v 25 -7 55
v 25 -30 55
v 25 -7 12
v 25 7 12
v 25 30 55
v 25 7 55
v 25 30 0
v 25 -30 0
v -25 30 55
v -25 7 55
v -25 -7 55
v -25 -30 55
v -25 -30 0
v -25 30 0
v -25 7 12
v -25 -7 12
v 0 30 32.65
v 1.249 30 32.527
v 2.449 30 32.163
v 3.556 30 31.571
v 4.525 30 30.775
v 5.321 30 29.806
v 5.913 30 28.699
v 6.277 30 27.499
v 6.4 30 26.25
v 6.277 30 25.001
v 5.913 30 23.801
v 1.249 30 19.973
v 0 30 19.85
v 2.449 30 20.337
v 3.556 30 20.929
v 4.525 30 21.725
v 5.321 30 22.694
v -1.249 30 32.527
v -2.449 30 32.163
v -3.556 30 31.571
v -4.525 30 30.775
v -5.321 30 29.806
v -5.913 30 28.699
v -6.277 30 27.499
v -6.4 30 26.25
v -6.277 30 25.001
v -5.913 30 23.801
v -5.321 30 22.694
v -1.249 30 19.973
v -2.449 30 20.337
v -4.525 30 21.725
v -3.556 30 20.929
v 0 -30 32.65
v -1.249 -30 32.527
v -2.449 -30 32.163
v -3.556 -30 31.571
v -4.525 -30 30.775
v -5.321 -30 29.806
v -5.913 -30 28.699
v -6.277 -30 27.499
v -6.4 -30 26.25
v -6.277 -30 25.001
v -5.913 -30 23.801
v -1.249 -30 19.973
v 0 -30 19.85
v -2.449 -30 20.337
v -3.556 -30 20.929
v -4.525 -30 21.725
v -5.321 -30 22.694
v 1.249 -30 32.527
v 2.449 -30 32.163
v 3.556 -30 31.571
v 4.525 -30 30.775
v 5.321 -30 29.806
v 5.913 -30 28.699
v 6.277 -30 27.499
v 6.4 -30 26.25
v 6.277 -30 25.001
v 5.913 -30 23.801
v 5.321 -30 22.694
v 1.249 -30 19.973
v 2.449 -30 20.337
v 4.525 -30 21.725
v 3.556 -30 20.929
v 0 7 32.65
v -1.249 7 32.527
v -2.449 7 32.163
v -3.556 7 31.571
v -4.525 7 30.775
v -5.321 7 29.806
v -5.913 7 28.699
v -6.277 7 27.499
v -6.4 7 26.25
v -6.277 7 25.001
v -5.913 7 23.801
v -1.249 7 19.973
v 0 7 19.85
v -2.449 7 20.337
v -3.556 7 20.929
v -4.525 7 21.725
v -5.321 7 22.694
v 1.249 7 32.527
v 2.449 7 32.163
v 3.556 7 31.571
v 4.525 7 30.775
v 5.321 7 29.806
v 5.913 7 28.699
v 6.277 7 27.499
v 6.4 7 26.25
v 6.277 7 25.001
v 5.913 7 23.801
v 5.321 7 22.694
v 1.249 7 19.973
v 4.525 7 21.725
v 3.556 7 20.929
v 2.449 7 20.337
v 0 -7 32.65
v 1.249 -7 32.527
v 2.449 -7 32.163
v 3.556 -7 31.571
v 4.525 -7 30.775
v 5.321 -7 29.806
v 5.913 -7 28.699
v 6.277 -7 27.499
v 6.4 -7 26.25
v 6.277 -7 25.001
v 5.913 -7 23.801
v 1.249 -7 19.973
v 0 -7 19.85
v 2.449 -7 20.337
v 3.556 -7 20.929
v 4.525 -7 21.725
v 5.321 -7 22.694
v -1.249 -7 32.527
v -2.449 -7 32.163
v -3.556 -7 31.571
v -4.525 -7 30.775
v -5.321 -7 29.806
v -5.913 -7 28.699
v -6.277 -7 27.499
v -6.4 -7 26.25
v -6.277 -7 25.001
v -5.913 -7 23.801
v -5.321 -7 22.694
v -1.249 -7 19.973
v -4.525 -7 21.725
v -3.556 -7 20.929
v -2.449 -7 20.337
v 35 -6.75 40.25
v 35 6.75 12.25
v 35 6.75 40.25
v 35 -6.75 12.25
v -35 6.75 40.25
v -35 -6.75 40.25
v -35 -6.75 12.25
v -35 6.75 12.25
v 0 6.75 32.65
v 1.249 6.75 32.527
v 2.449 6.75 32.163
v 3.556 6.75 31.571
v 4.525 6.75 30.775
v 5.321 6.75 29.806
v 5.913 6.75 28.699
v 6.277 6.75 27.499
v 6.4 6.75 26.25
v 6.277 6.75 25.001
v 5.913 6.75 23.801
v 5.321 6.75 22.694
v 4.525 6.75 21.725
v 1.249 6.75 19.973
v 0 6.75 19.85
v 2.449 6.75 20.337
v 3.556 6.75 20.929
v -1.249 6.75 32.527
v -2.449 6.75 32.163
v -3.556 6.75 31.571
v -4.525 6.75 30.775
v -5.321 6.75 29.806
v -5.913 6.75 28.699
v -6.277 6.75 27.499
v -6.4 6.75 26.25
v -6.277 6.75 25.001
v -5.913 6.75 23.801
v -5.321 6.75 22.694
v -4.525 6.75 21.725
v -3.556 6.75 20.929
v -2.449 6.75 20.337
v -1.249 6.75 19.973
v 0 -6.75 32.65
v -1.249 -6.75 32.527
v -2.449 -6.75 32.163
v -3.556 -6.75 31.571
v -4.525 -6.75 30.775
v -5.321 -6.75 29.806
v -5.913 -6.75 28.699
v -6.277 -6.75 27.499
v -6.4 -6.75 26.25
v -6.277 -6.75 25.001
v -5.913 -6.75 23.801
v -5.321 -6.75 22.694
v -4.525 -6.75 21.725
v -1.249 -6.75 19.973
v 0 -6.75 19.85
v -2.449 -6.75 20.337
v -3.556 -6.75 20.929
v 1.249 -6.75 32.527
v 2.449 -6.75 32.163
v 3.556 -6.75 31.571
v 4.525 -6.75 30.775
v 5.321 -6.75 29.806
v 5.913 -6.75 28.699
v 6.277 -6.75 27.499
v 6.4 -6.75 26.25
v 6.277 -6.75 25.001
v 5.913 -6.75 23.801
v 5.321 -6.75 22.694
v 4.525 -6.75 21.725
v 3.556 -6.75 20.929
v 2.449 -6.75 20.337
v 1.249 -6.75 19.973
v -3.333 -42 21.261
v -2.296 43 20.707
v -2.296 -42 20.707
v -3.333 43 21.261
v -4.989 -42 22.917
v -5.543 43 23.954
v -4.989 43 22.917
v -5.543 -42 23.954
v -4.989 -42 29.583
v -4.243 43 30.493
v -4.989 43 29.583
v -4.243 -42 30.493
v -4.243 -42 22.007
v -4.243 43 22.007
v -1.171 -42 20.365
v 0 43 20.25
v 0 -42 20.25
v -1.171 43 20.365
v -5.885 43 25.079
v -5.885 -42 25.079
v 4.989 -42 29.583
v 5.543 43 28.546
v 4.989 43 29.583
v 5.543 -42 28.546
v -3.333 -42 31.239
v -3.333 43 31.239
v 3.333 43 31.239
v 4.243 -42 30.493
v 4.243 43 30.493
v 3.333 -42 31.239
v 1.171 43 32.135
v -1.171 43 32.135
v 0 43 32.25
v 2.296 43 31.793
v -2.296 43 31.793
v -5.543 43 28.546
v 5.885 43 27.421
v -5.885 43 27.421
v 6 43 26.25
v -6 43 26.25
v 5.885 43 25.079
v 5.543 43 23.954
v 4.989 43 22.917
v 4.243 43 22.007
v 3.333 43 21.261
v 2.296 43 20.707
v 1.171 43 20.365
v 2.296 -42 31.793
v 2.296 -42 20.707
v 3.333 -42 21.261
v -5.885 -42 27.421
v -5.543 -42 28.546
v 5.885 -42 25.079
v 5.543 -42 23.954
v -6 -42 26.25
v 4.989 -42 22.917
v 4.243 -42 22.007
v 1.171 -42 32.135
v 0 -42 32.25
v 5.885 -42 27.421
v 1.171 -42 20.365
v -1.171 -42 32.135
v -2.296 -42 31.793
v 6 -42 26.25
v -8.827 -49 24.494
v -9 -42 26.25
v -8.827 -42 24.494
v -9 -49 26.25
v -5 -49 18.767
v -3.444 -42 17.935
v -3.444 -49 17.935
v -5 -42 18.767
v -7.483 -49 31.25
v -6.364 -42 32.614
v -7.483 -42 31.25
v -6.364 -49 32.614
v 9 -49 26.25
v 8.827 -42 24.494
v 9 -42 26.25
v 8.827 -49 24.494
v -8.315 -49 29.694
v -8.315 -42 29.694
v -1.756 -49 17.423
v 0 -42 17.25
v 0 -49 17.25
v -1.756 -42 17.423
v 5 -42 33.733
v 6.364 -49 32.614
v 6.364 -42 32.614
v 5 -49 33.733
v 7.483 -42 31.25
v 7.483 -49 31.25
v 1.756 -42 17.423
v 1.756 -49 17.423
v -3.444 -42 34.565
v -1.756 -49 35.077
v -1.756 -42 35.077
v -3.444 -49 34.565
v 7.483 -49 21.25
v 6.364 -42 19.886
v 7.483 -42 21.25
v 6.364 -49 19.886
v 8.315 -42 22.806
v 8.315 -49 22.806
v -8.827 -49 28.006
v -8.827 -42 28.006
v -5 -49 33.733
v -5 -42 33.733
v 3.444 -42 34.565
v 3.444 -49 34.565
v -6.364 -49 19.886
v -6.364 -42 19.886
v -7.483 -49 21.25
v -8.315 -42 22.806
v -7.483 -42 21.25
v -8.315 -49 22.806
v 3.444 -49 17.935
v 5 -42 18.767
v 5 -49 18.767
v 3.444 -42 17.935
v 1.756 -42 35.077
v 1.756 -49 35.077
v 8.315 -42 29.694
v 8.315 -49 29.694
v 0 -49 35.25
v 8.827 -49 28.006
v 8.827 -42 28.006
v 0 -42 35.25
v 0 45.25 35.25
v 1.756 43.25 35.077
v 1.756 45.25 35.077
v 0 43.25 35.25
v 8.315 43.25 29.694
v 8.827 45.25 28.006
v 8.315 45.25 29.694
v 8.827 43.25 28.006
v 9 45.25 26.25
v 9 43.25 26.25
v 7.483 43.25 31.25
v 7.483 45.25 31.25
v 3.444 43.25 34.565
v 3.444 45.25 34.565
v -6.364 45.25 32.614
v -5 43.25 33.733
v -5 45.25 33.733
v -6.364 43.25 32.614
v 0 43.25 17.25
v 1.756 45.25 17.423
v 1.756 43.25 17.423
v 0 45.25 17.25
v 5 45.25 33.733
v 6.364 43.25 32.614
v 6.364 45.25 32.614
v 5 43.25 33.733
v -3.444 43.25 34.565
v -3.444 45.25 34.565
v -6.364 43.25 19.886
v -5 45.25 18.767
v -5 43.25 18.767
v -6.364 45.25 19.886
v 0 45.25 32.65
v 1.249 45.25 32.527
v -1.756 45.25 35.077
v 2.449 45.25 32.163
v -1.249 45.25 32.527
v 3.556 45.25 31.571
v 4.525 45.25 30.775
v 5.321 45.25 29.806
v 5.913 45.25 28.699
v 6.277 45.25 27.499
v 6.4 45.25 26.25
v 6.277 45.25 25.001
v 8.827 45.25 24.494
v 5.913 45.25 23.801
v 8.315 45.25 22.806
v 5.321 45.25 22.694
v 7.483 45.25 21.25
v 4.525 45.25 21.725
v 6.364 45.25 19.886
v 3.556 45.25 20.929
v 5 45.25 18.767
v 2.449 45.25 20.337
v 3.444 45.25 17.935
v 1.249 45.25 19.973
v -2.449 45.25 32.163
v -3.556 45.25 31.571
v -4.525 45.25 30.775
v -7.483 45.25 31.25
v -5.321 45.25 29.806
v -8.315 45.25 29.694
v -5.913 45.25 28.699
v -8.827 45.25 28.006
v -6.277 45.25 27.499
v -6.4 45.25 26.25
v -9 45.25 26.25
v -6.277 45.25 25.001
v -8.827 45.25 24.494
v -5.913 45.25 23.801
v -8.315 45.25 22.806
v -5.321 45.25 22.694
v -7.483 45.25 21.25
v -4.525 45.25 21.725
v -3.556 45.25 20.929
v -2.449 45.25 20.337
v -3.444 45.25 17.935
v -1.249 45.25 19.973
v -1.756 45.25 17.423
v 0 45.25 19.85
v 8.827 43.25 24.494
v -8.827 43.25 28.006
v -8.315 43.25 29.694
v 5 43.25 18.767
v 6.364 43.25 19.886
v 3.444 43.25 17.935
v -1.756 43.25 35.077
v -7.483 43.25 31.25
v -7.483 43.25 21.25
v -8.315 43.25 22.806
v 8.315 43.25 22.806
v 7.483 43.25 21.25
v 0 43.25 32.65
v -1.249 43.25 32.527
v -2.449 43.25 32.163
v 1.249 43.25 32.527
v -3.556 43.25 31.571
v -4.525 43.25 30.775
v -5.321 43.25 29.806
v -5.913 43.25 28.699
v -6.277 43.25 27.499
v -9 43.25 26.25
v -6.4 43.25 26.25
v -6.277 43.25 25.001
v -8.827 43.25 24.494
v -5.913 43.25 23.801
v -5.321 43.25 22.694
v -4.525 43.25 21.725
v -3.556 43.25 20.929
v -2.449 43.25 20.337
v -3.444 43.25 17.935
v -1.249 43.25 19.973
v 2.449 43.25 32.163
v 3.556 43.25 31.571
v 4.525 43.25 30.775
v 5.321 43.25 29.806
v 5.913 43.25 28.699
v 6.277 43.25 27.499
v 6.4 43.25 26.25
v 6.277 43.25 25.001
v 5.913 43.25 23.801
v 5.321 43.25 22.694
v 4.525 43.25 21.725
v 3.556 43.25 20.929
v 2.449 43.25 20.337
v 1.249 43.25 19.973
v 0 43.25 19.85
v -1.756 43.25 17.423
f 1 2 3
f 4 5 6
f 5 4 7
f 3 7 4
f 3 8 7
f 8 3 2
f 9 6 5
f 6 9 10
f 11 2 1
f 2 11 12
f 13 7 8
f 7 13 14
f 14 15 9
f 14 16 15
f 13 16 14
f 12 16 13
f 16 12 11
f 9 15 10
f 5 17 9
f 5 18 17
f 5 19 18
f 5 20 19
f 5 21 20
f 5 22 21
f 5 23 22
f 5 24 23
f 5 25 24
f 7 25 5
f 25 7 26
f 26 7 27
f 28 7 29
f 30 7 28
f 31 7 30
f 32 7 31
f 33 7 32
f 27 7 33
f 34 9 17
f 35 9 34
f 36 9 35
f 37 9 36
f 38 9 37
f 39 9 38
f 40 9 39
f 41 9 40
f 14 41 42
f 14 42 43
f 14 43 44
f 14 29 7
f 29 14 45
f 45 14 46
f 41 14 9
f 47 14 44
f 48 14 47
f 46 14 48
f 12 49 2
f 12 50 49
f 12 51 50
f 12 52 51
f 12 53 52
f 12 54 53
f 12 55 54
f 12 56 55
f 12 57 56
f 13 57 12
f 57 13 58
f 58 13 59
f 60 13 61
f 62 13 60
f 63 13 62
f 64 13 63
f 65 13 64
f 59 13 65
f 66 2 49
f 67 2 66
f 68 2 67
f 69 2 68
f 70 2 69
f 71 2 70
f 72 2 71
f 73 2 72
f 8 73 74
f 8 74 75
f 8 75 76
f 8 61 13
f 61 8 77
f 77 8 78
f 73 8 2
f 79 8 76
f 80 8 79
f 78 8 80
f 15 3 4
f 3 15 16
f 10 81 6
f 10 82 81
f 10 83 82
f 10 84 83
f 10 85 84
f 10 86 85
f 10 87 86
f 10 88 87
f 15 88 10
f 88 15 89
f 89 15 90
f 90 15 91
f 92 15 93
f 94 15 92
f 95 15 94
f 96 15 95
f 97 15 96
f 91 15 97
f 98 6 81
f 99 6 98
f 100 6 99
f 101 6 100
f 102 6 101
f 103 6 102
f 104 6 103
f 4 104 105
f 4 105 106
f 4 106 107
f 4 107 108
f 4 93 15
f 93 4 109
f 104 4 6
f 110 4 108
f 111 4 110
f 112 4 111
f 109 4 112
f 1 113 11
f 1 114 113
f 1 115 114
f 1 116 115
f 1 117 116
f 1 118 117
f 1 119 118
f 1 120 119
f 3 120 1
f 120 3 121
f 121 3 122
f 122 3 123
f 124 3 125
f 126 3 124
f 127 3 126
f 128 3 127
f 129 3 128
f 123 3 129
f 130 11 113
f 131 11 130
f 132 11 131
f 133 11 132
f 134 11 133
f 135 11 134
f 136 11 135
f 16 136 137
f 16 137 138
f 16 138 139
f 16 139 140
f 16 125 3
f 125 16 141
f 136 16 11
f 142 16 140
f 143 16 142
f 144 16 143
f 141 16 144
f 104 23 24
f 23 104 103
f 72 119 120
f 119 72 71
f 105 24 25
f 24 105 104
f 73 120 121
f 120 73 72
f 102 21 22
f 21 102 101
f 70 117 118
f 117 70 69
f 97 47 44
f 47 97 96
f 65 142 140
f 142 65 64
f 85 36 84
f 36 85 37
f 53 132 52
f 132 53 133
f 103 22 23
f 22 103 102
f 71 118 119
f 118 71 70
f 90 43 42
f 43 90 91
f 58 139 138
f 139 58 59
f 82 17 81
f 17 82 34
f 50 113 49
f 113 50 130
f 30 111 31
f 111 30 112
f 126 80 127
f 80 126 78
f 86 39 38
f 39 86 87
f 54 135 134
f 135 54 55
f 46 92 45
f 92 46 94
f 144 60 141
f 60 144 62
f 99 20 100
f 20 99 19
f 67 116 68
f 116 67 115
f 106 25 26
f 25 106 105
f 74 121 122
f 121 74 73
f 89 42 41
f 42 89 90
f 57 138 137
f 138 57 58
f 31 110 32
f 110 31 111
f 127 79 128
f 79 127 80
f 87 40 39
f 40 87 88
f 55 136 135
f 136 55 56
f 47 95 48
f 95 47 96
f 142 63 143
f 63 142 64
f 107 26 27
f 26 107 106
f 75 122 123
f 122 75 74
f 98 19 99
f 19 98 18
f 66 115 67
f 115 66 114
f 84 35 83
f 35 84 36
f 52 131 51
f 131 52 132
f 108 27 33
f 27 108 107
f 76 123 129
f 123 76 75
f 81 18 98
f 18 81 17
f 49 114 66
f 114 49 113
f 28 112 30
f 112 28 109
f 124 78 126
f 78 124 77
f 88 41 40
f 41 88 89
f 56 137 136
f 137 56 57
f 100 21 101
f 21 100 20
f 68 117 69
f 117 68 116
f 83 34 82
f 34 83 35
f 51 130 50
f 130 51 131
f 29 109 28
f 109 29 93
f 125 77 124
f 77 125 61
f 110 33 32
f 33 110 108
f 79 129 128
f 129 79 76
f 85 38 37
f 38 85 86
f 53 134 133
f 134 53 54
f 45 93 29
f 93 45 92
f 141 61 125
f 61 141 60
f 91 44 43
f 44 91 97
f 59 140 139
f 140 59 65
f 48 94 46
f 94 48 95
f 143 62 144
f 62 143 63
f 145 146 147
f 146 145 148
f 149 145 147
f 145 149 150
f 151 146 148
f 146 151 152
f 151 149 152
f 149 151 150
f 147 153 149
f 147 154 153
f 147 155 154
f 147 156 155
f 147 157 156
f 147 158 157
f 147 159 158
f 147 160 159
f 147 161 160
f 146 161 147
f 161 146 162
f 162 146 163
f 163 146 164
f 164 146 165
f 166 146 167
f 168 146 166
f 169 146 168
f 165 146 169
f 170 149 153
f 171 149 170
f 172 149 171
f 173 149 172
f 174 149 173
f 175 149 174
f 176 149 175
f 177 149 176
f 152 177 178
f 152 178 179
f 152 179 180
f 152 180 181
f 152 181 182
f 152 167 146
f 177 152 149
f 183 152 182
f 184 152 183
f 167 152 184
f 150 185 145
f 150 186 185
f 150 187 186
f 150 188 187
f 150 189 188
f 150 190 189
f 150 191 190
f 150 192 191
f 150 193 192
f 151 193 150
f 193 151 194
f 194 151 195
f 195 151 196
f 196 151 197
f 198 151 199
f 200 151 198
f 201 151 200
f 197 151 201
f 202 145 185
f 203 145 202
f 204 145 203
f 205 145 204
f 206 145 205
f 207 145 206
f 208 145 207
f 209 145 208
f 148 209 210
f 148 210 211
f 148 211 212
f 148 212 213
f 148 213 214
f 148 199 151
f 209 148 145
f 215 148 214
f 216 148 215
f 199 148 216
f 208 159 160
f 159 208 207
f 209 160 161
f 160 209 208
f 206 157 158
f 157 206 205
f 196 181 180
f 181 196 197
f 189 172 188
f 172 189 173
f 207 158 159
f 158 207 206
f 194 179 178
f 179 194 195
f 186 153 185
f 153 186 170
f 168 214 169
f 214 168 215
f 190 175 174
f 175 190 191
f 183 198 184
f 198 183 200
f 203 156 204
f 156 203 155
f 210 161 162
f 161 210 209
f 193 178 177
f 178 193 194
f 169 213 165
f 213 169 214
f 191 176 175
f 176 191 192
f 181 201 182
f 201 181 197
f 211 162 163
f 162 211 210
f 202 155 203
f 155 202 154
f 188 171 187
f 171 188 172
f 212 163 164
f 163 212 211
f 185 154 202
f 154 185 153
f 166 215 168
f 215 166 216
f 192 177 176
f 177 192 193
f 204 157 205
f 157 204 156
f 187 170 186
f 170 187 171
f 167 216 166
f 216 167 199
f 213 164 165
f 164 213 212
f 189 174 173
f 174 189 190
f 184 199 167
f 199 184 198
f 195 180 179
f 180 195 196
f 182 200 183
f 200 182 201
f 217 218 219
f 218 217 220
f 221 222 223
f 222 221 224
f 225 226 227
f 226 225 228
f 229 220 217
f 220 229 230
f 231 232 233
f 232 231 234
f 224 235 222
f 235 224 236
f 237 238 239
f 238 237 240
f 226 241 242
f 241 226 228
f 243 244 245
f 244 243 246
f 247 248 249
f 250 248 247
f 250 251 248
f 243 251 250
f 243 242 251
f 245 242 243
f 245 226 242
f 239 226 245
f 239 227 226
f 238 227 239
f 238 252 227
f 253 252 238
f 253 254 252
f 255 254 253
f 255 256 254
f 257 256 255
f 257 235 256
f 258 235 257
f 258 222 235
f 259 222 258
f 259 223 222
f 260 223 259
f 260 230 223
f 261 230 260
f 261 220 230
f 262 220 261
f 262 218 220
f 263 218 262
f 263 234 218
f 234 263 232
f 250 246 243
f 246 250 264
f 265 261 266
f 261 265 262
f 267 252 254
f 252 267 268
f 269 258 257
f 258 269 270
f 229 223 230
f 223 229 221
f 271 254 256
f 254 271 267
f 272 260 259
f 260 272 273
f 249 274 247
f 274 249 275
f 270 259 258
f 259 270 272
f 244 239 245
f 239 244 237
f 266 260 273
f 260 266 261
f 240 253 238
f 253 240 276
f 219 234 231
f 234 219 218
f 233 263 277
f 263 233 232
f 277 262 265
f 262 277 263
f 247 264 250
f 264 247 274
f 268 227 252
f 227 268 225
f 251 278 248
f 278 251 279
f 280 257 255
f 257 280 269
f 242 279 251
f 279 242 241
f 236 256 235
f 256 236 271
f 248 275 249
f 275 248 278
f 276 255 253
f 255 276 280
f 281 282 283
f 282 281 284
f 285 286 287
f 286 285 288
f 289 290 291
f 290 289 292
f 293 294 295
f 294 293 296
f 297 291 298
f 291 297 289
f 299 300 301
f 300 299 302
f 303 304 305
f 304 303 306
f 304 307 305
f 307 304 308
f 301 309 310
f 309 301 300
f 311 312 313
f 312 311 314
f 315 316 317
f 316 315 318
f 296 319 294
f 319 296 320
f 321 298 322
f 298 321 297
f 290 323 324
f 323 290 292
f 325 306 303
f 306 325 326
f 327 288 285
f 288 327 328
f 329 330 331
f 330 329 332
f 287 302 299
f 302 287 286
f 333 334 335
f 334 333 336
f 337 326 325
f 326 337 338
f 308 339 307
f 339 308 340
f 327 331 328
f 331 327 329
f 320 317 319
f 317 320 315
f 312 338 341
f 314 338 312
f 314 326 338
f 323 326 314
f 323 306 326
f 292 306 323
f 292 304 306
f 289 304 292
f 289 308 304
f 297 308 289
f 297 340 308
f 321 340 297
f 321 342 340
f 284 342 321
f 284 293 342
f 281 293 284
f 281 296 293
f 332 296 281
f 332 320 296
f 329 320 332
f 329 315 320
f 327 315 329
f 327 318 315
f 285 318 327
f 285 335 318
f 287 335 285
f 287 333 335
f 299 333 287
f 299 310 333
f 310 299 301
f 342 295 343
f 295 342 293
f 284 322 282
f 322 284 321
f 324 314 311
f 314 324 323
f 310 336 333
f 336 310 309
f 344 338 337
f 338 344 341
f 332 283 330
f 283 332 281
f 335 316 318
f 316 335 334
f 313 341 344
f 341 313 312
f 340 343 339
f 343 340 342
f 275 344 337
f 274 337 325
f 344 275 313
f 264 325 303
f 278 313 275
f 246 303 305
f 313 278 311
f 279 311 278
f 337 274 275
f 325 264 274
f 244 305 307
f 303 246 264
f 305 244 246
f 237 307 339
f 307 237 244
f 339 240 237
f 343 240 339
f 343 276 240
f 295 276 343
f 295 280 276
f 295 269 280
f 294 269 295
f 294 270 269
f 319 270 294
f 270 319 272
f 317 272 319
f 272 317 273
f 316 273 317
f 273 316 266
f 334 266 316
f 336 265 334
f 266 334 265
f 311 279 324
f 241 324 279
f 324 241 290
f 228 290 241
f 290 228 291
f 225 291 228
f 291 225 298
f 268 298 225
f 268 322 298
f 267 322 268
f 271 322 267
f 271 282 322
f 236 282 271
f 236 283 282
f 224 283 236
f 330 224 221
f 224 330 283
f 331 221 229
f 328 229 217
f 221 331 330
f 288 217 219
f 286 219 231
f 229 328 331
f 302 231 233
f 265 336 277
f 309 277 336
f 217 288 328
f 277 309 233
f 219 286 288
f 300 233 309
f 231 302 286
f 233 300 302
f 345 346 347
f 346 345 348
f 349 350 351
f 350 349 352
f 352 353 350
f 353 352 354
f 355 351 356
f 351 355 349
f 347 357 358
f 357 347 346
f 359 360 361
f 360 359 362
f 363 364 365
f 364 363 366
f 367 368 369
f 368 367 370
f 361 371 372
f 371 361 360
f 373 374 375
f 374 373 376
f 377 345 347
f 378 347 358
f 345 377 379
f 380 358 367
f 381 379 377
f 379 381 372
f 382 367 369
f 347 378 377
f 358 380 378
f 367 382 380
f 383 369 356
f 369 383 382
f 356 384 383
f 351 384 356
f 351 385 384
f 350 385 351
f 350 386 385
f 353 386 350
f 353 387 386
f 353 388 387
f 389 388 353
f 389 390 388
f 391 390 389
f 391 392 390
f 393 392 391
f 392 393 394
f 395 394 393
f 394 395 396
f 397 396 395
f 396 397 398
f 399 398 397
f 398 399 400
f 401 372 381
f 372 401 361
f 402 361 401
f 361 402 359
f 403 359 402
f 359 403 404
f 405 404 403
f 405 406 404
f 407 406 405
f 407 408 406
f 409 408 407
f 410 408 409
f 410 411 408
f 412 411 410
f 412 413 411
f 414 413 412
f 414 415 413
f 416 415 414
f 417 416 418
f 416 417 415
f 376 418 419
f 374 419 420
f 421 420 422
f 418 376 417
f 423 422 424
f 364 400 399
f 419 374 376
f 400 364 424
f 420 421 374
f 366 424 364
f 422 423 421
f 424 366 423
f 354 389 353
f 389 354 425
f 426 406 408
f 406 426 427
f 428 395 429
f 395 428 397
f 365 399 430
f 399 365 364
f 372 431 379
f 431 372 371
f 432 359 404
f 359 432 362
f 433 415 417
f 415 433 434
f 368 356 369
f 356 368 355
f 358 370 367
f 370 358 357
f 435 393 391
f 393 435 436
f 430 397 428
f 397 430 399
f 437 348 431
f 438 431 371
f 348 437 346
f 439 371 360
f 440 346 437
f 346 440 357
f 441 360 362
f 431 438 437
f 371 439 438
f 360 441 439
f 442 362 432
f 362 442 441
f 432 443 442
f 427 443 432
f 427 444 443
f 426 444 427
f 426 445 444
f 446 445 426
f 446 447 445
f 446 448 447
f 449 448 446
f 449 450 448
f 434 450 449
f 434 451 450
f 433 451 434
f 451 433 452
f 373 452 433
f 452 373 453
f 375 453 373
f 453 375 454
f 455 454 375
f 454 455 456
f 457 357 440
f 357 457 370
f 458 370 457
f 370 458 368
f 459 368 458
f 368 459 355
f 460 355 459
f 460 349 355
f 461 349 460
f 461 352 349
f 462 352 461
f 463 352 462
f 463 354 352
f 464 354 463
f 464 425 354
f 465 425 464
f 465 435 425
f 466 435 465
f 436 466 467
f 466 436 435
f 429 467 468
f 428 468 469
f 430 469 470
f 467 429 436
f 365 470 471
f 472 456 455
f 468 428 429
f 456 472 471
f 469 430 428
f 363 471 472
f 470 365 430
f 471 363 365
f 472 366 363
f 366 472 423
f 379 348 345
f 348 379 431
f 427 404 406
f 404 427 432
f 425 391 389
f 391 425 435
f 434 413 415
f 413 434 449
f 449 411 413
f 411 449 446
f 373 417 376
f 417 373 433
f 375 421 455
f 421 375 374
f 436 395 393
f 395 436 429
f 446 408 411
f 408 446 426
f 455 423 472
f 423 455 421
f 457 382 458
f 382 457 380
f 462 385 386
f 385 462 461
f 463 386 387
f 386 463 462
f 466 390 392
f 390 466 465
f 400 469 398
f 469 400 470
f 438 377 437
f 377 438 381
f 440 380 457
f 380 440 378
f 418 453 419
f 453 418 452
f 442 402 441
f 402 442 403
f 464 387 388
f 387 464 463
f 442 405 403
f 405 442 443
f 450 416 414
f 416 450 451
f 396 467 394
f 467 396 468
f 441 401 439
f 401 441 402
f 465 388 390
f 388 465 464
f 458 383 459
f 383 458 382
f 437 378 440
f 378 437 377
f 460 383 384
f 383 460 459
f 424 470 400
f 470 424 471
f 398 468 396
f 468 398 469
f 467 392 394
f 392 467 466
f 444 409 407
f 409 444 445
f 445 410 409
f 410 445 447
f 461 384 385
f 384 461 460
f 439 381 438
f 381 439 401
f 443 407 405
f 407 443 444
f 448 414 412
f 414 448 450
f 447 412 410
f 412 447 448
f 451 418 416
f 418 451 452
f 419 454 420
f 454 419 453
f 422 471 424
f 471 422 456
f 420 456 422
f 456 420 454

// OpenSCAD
$fn = 32;

// ------------------------------------------------------------------------
// Clevis joint: 50 mm clevis, pin d12
// Every part is its own module, assembly() places them once.
// ------------------------------------------------------------------------

// --- part 1 ---
module clevis() {
  difference() {
    translate([-25, -30, 0]) cube([50, 60, 55]);
    translate([-26, -7, 12]) cube([52, 14, 44]);
    translate([0, 0, 26.25]) rotate([90, 0, 0]) cylinder(h = 62, d = 12.8, center = true);
  }
}

// --- part 2 ---
module eye() {
  difference() {
    translate([-35, -6.75, 0]) cube([70, 13.5, 28]);
    translate([0, 0, 14]) rotate([90, 0, 0]) cylinder(h = 15.5, d = 12.8, center = true);
  }
}

// --- part 3 ---
module pin() {
  rotate([0, 90, 0]) cylinder(h = 86, d = 12, center = true);
  translate([-49, 0, 0]) rotate([0, 90, 0]) cylinder(h = 7, d = 18);
}

// --- part 4 ---
module retainer() {
  difference() {
      translate([0, 0, 0]) cylinder(h = 2, d = 18);
      translate([0, 0, -1]) cylinder(h = 4, d = 12.8);
    }
}

// --- assembly ---
module assembly() {
  translate([0, 0, 0]) rotate([0, 0, 0]) clevis();
  translate([0, 0, 12.25]) rotate([0, 0, 0]) eye();
  translate([0, 0, 26.25]) rotate([0, 0, 90]) pin();
  translate([0, 45.25, 26.25]) rotate([90, 0, 0]) retainer();
}

assembly();
